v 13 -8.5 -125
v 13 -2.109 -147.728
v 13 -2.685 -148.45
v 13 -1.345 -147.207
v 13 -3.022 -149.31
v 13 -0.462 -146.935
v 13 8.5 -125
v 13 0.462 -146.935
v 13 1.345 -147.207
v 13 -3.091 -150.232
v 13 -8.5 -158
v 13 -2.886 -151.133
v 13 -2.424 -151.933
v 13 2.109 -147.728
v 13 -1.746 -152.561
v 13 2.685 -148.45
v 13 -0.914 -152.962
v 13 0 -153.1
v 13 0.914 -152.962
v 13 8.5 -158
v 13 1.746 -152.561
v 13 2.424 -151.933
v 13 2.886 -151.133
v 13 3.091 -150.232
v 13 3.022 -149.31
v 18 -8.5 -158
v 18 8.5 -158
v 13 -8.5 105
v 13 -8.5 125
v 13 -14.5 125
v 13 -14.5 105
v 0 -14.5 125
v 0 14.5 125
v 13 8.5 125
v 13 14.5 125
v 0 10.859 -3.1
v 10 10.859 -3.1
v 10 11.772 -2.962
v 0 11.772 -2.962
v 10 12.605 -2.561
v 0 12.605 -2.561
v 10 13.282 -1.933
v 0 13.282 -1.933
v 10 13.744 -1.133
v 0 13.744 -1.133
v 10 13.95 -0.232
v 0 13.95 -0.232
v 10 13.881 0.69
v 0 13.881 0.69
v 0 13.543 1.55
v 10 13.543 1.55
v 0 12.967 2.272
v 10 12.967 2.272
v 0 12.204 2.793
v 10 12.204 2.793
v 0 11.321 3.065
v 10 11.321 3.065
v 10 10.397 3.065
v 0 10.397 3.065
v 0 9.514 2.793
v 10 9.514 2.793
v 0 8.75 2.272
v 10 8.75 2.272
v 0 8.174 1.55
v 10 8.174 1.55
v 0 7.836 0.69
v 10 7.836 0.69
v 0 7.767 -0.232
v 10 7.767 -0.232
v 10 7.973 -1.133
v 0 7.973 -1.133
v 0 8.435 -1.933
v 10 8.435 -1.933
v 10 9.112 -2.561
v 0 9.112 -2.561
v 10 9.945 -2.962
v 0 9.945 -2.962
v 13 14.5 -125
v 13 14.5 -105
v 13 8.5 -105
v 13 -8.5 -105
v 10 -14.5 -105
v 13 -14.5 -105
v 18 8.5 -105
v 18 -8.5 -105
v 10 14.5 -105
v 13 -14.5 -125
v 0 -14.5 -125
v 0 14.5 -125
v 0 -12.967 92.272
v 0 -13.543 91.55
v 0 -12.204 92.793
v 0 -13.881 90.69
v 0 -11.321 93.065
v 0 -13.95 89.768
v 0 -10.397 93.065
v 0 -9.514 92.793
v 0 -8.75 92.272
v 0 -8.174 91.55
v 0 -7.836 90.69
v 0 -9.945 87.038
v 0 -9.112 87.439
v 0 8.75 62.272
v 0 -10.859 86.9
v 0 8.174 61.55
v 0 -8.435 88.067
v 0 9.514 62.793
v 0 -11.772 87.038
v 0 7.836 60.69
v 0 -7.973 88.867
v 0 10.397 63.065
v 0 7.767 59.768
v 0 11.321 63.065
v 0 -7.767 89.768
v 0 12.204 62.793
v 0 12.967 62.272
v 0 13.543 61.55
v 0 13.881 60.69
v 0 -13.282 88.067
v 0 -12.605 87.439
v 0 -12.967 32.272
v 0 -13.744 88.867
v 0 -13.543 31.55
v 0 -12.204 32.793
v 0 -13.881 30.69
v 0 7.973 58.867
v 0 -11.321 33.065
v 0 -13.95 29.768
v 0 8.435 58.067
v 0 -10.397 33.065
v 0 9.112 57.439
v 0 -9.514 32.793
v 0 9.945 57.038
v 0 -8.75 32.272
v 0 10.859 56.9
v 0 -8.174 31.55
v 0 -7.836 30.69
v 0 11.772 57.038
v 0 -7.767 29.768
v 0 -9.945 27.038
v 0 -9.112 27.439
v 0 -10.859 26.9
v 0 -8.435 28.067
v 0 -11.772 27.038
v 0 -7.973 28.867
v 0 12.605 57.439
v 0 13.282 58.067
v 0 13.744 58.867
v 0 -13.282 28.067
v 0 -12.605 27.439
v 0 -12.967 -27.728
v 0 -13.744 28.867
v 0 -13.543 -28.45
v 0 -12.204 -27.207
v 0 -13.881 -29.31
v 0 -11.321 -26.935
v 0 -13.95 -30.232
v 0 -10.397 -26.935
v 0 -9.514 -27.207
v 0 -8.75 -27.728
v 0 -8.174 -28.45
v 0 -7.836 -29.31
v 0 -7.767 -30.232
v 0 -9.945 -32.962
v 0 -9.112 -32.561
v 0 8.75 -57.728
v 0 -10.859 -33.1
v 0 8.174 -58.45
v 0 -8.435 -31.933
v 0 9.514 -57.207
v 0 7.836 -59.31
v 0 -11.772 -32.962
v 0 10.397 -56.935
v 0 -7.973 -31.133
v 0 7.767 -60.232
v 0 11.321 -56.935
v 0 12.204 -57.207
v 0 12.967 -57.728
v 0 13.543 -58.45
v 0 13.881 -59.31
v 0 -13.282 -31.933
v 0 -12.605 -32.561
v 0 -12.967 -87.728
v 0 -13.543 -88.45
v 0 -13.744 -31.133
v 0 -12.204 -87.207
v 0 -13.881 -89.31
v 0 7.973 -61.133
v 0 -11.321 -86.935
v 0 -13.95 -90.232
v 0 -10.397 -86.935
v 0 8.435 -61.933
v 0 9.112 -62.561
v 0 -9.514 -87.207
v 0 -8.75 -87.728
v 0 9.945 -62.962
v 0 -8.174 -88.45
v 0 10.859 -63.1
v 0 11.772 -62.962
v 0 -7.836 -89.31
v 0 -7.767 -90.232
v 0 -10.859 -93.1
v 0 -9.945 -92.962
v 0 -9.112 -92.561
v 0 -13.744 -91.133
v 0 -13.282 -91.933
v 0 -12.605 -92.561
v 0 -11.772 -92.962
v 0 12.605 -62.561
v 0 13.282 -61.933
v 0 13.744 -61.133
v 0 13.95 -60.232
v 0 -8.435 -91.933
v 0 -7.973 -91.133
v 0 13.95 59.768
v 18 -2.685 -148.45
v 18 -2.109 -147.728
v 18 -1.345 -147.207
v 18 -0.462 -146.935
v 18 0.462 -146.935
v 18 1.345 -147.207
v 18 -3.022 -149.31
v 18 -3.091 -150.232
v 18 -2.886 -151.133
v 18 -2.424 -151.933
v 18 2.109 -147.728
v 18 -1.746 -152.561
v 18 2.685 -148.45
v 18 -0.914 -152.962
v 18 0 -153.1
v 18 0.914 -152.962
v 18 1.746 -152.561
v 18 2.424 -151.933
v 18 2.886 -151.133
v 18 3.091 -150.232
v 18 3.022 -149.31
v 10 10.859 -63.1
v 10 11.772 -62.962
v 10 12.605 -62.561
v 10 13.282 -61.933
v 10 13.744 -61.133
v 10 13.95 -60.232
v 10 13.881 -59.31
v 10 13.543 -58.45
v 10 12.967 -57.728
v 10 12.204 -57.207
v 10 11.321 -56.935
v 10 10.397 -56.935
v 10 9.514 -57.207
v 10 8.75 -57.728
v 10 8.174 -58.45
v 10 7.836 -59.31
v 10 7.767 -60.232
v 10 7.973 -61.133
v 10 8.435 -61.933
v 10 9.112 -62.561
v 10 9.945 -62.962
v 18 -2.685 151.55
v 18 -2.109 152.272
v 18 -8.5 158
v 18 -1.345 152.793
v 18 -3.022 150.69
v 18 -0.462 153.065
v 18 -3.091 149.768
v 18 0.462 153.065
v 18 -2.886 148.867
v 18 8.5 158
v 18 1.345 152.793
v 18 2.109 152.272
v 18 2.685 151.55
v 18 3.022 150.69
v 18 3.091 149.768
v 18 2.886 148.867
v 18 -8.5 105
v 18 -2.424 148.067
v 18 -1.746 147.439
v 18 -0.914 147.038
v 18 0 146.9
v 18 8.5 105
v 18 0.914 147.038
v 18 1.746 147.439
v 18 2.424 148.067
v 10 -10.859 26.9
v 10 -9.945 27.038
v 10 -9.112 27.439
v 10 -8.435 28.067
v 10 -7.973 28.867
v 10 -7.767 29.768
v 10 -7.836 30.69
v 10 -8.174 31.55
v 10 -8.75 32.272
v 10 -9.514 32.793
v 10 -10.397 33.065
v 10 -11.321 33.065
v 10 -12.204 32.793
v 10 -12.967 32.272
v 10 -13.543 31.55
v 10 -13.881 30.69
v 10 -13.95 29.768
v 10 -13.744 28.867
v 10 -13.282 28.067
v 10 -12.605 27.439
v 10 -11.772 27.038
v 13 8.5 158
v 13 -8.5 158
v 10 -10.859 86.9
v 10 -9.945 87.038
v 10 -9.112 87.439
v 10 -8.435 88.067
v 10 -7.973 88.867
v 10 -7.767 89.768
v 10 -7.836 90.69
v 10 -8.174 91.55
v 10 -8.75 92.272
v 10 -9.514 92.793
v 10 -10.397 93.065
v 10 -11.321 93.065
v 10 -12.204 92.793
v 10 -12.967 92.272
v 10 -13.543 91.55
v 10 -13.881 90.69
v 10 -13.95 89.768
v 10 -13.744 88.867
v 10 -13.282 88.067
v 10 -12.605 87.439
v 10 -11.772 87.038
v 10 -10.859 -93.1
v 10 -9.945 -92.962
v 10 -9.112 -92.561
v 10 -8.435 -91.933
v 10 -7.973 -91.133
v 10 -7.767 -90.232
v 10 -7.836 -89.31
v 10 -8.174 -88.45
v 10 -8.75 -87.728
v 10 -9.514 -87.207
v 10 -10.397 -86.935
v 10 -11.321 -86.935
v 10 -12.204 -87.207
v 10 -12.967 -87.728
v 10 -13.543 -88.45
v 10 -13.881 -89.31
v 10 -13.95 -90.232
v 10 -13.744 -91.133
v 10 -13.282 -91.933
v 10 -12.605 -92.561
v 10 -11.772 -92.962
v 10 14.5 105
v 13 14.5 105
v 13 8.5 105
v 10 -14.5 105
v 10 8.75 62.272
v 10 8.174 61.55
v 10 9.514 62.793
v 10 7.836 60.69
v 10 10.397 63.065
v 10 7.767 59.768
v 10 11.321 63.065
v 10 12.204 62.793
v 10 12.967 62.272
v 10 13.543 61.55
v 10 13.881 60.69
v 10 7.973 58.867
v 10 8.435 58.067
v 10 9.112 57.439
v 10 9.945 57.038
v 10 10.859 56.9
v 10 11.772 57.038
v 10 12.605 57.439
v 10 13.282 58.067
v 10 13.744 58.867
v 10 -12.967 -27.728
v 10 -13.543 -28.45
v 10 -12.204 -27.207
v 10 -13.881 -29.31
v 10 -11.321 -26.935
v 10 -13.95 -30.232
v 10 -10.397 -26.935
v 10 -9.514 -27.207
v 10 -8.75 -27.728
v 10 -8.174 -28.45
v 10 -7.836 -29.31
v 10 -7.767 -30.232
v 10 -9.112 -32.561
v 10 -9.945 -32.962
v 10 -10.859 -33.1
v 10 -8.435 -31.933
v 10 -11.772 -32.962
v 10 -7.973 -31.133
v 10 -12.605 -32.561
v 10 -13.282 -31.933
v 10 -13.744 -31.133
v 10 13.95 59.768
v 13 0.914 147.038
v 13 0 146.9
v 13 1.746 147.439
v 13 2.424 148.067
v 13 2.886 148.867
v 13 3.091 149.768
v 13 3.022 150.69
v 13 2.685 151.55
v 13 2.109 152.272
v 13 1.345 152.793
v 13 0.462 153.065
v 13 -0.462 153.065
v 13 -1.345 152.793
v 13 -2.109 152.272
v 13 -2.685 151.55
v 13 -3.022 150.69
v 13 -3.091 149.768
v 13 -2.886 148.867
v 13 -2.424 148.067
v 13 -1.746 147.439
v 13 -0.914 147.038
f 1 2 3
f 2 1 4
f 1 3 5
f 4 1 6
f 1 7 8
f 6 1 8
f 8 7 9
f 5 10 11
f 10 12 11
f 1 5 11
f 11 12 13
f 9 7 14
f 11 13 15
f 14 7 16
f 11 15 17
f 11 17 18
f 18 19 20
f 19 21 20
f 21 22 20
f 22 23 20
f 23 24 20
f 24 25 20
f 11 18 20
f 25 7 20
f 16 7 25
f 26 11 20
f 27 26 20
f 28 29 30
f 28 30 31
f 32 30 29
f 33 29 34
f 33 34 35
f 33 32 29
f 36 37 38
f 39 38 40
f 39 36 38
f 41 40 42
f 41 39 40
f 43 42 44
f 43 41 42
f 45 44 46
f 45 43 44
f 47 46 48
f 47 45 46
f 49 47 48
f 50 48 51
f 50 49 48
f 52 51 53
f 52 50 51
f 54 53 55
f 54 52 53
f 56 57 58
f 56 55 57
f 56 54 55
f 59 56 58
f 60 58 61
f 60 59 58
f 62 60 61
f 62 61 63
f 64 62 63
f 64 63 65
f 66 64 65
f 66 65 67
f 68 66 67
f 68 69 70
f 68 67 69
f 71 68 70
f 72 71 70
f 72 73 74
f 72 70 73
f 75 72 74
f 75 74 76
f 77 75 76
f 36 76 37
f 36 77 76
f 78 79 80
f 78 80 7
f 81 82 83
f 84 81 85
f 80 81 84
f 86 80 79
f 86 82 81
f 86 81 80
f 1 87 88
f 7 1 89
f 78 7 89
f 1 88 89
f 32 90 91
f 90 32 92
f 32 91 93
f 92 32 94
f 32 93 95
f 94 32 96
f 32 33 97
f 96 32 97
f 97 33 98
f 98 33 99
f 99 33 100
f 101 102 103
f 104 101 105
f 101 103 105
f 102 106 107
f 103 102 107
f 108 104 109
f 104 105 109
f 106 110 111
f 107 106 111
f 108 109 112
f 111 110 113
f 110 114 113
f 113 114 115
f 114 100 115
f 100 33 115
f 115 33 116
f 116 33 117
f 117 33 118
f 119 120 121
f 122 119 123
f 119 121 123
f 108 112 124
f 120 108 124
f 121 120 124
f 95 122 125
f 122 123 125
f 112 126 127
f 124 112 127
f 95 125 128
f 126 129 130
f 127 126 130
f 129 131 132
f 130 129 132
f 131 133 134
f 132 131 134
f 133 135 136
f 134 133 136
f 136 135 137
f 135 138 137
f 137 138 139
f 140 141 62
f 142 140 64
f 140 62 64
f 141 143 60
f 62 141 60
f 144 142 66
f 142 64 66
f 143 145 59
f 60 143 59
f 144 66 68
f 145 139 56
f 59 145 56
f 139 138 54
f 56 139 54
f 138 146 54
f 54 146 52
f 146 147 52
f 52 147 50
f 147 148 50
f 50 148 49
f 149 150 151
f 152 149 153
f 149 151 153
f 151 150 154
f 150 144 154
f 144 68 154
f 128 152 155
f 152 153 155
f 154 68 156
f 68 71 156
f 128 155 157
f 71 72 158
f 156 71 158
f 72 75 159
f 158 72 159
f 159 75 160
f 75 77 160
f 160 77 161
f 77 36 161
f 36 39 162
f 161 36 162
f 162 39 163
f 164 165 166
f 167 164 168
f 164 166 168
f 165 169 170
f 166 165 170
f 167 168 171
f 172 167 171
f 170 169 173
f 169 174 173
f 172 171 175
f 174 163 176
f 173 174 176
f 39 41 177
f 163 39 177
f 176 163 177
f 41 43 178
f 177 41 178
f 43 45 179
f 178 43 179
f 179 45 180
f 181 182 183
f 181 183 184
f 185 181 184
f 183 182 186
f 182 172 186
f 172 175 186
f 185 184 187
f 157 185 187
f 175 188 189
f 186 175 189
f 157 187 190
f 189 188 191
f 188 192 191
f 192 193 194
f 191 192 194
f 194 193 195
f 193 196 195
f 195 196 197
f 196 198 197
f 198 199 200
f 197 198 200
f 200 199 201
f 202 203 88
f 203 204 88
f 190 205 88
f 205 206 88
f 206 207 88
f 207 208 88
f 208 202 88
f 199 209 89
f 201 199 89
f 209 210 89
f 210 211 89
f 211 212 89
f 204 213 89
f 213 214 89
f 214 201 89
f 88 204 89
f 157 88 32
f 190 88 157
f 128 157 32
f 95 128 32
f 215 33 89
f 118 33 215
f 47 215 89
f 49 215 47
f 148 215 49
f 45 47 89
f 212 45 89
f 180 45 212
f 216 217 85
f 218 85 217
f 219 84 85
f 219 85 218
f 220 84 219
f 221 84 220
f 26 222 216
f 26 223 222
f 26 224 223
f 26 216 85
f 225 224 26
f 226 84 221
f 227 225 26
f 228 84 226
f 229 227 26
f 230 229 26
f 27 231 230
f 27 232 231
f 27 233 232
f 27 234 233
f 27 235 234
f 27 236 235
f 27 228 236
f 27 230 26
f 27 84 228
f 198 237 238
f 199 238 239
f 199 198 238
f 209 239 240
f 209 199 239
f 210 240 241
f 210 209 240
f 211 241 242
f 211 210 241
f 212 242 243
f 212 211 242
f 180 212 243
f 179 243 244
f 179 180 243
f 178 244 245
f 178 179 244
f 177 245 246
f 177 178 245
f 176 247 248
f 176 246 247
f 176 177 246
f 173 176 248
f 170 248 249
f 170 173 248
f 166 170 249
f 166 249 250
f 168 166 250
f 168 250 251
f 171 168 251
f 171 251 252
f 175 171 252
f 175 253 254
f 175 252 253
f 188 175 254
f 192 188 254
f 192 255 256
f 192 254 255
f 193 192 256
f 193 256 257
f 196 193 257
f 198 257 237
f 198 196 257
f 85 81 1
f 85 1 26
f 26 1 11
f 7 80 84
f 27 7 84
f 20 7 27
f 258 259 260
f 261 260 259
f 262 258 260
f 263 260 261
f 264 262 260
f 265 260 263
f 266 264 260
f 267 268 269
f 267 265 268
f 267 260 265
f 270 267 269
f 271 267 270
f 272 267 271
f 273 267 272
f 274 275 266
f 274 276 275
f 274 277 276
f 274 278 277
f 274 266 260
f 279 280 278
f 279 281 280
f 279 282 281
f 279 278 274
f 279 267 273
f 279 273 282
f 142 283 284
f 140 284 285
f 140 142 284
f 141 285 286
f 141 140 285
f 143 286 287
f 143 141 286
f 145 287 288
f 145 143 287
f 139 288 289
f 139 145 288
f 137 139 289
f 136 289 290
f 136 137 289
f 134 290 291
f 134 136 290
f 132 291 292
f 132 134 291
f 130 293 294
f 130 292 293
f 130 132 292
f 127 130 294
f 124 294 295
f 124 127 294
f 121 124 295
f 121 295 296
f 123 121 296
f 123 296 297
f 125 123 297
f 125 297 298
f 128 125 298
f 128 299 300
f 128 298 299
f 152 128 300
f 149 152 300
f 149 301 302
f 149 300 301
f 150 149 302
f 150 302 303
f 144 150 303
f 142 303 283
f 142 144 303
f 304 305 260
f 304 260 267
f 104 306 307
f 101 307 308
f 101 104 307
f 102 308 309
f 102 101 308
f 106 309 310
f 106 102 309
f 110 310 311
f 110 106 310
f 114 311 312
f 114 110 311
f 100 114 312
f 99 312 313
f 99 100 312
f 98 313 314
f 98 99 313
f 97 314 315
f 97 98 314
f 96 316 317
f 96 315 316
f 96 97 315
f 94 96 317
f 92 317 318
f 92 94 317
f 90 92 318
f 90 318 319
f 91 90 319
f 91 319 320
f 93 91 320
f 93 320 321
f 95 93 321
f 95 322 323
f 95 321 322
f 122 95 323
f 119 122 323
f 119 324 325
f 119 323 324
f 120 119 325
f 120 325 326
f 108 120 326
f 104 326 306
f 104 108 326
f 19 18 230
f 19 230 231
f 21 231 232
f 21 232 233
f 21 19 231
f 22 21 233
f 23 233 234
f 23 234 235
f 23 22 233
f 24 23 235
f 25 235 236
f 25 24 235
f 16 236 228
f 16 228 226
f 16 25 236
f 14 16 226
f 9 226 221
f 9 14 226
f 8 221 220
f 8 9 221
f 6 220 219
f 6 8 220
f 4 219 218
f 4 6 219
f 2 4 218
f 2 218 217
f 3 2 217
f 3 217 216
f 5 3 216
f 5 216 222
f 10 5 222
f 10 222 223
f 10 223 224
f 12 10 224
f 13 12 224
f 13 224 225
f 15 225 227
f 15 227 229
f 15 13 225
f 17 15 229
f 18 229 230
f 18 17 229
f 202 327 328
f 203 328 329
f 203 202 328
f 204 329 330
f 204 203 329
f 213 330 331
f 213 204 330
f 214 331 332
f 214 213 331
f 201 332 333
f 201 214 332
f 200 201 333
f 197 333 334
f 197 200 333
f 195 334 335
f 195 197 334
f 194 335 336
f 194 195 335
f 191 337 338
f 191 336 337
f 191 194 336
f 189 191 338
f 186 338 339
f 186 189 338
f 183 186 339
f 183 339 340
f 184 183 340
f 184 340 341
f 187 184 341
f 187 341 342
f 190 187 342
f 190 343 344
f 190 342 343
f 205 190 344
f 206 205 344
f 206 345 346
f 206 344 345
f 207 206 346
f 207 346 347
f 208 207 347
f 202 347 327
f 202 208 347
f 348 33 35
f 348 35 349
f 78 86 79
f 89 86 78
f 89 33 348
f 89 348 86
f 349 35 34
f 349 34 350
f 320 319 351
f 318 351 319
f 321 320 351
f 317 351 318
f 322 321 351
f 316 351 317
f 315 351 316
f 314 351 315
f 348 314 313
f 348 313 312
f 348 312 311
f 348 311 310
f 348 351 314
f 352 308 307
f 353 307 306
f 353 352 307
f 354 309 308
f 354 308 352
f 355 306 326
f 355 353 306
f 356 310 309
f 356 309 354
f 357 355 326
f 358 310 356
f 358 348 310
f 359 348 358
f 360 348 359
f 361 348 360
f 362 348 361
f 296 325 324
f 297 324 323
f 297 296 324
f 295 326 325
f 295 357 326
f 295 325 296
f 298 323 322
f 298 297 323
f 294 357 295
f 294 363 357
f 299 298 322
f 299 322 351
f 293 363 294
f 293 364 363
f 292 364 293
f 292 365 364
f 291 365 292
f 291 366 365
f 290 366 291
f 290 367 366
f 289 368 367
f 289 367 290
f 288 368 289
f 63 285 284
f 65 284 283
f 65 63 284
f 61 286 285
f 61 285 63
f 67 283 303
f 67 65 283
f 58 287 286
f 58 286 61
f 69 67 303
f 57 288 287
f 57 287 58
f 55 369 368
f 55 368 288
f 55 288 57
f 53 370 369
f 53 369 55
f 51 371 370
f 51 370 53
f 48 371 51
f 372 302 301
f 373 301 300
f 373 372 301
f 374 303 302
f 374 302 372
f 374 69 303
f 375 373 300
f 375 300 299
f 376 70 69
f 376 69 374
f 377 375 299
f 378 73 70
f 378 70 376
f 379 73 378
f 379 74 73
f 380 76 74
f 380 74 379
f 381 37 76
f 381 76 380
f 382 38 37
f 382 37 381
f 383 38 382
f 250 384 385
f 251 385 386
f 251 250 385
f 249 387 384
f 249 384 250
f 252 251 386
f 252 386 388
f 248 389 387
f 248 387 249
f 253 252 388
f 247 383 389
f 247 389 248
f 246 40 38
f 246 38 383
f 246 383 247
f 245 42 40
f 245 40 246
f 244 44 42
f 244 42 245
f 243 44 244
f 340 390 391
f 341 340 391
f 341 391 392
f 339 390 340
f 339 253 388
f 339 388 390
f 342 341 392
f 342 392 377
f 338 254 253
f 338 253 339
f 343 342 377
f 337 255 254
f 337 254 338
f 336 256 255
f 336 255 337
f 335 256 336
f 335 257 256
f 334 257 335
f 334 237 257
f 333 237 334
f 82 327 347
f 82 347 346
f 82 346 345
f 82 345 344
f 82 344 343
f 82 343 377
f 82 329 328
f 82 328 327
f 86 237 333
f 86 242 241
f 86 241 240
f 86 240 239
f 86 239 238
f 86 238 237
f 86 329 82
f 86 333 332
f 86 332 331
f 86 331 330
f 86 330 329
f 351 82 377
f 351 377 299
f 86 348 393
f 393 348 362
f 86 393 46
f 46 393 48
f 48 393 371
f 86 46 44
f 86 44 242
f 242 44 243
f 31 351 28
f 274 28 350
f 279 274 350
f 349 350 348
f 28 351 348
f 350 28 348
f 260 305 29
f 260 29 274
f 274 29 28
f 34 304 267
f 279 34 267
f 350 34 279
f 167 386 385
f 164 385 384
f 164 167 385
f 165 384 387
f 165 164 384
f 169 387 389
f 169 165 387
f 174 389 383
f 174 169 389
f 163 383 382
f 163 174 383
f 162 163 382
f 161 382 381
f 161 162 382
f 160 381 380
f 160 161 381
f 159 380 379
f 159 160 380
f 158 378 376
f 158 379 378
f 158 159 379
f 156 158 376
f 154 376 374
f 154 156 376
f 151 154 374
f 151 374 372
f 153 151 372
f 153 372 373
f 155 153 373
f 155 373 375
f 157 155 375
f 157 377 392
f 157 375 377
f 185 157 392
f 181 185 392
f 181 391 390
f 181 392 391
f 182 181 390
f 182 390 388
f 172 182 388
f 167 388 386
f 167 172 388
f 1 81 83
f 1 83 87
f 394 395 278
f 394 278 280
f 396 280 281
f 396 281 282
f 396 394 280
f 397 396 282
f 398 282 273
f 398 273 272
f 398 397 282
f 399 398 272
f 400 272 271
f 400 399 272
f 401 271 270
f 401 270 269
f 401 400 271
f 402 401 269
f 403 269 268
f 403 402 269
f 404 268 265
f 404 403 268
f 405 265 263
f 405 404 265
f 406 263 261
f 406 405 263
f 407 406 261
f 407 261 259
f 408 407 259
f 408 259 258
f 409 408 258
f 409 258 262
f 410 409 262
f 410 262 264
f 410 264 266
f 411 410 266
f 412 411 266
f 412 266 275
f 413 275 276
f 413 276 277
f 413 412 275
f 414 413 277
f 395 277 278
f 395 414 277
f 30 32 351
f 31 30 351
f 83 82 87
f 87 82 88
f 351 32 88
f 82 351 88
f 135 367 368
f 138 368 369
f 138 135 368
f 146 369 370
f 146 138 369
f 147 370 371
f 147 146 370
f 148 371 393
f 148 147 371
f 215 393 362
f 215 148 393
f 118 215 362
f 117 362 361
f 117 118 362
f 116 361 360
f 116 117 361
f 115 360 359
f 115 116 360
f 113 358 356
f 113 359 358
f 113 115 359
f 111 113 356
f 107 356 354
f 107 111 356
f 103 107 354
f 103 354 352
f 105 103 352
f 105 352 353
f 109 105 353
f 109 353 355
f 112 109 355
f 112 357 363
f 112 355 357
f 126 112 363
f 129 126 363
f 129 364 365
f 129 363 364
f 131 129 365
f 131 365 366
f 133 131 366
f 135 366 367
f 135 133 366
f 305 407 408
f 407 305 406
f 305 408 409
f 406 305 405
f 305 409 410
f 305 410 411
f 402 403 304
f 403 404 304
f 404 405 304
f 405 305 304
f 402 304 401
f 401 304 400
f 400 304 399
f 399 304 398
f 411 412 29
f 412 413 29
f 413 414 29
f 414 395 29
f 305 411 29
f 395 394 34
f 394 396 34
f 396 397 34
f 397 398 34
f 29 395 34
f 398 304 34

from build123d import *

# Parameters (mm, degrees)
SKETCH_1_W          = 250
SKETCH_1_H          = 29
EXTRUDE_1_DEPTH     = 10
SKETCH_1_3_R        = 3.1
CUT_EXTRUDE_1_DEPTH = 127.234900087
SKETCH_3_W          = 20
SKETCH_3_H          = 29
EXTRUDE_2_DEPTH     = 3
SKETCH_4_W          = 53
SKETCH_4_H          = 17
SKETCH_4_R          = 3.1
EXTRUDE_3_DEPTH     = 5


with BuildPart() as part:
    # 草图1 → 凸台-拉伸1 (new body)
    with BuildSketch(Plane(origin=(0, 0, 0), x_dir=(0, 0, -1), z_dir=(1, 0, 0))):
        Rectangle(SKETCH_1_W, SKETCH_1_H)
    extrude(amount=EXTRUDE_1_DEPTH)

    # 草图1<3> → 切除-拉伸1 (cut, through all)
    with BuildSketch(Plane(origin=(0, 0, 0), x_dir=(0, 0, -1), z_dir=(1, 0, 0))):
        with Locations((-90, -10.858617882)):
            Circle(SKETCH_1_3_R)
        with Locations((-30, -10.858617882)):
            Circle(SKETCH_1_3_R)
        with Locations((30, -10.858617882)):
            Circle(SKETCH_1_3_R)
        with Locations((-60, 10.858617882)):
            Circle(SKETCH_1_3_R)
        with Locations((90, -10.858617882)):
            Circle(SKETCH_1_3_R)
        with Locations((0, 10.858617882)):
            Circle(SKETCH_1_3_R)
        with Locations((60, 10.858617882)):
            Circle(SKETCH_1_3_R)
    extrude(amount=CUT_EXTRUDE_1_DEPTH, mode=Mode.SUBTRACT)

    # 草图3 → 凸台-拉伸2 (add)
    with BuildSketch(Plane(origin=(10, 0, 0), x_dir=(0, 0, -1), z_dir=(1, 0, 0))):
        with Locations((115, 0)):
            Rectangle(SKETCH_3_W, SKETCH_3_H)
        with Locations((-115, 0)):
            Rectangle(SKETCH_3_W, SKETCH_3_H)
    extrude(amount=EXTRUDE_2_DEPTH)

    # 草图4 → 凸台-拉伸3 (add)
    # profile 1 of 2: a face of its own
    with BuildSketch(Plane(origin=(13, 0, 0), x_dir=(0, 0, -1), z_dir=(1, 0, 0))):
        with Locations((131.5, 0)):
            Rectangle(SKETCH_4_W, SKETCH_4_H)
        with Locations((150, 0)):
            Circle(SKETCH_4_R, mode=Mode.SUBTRACT)
    # profile 2 of 2: a face of its own
    with BuildSketch(Plane(origin=(13, 0, 0), x_dir=(0, 0, -1), z_dir=(1, 0, 0))):
        with Locations((-131.5, 0)):
            Rectangle(SKETCH_4_W, SKETCH_4_H)
        with Locations((-150, 0)):
            Circle(SKETCH_4_R, mode=Mode.SUBTRACT)
    extrude(amount=EXTRUDE_3_DEPTH)


solid = part.part
